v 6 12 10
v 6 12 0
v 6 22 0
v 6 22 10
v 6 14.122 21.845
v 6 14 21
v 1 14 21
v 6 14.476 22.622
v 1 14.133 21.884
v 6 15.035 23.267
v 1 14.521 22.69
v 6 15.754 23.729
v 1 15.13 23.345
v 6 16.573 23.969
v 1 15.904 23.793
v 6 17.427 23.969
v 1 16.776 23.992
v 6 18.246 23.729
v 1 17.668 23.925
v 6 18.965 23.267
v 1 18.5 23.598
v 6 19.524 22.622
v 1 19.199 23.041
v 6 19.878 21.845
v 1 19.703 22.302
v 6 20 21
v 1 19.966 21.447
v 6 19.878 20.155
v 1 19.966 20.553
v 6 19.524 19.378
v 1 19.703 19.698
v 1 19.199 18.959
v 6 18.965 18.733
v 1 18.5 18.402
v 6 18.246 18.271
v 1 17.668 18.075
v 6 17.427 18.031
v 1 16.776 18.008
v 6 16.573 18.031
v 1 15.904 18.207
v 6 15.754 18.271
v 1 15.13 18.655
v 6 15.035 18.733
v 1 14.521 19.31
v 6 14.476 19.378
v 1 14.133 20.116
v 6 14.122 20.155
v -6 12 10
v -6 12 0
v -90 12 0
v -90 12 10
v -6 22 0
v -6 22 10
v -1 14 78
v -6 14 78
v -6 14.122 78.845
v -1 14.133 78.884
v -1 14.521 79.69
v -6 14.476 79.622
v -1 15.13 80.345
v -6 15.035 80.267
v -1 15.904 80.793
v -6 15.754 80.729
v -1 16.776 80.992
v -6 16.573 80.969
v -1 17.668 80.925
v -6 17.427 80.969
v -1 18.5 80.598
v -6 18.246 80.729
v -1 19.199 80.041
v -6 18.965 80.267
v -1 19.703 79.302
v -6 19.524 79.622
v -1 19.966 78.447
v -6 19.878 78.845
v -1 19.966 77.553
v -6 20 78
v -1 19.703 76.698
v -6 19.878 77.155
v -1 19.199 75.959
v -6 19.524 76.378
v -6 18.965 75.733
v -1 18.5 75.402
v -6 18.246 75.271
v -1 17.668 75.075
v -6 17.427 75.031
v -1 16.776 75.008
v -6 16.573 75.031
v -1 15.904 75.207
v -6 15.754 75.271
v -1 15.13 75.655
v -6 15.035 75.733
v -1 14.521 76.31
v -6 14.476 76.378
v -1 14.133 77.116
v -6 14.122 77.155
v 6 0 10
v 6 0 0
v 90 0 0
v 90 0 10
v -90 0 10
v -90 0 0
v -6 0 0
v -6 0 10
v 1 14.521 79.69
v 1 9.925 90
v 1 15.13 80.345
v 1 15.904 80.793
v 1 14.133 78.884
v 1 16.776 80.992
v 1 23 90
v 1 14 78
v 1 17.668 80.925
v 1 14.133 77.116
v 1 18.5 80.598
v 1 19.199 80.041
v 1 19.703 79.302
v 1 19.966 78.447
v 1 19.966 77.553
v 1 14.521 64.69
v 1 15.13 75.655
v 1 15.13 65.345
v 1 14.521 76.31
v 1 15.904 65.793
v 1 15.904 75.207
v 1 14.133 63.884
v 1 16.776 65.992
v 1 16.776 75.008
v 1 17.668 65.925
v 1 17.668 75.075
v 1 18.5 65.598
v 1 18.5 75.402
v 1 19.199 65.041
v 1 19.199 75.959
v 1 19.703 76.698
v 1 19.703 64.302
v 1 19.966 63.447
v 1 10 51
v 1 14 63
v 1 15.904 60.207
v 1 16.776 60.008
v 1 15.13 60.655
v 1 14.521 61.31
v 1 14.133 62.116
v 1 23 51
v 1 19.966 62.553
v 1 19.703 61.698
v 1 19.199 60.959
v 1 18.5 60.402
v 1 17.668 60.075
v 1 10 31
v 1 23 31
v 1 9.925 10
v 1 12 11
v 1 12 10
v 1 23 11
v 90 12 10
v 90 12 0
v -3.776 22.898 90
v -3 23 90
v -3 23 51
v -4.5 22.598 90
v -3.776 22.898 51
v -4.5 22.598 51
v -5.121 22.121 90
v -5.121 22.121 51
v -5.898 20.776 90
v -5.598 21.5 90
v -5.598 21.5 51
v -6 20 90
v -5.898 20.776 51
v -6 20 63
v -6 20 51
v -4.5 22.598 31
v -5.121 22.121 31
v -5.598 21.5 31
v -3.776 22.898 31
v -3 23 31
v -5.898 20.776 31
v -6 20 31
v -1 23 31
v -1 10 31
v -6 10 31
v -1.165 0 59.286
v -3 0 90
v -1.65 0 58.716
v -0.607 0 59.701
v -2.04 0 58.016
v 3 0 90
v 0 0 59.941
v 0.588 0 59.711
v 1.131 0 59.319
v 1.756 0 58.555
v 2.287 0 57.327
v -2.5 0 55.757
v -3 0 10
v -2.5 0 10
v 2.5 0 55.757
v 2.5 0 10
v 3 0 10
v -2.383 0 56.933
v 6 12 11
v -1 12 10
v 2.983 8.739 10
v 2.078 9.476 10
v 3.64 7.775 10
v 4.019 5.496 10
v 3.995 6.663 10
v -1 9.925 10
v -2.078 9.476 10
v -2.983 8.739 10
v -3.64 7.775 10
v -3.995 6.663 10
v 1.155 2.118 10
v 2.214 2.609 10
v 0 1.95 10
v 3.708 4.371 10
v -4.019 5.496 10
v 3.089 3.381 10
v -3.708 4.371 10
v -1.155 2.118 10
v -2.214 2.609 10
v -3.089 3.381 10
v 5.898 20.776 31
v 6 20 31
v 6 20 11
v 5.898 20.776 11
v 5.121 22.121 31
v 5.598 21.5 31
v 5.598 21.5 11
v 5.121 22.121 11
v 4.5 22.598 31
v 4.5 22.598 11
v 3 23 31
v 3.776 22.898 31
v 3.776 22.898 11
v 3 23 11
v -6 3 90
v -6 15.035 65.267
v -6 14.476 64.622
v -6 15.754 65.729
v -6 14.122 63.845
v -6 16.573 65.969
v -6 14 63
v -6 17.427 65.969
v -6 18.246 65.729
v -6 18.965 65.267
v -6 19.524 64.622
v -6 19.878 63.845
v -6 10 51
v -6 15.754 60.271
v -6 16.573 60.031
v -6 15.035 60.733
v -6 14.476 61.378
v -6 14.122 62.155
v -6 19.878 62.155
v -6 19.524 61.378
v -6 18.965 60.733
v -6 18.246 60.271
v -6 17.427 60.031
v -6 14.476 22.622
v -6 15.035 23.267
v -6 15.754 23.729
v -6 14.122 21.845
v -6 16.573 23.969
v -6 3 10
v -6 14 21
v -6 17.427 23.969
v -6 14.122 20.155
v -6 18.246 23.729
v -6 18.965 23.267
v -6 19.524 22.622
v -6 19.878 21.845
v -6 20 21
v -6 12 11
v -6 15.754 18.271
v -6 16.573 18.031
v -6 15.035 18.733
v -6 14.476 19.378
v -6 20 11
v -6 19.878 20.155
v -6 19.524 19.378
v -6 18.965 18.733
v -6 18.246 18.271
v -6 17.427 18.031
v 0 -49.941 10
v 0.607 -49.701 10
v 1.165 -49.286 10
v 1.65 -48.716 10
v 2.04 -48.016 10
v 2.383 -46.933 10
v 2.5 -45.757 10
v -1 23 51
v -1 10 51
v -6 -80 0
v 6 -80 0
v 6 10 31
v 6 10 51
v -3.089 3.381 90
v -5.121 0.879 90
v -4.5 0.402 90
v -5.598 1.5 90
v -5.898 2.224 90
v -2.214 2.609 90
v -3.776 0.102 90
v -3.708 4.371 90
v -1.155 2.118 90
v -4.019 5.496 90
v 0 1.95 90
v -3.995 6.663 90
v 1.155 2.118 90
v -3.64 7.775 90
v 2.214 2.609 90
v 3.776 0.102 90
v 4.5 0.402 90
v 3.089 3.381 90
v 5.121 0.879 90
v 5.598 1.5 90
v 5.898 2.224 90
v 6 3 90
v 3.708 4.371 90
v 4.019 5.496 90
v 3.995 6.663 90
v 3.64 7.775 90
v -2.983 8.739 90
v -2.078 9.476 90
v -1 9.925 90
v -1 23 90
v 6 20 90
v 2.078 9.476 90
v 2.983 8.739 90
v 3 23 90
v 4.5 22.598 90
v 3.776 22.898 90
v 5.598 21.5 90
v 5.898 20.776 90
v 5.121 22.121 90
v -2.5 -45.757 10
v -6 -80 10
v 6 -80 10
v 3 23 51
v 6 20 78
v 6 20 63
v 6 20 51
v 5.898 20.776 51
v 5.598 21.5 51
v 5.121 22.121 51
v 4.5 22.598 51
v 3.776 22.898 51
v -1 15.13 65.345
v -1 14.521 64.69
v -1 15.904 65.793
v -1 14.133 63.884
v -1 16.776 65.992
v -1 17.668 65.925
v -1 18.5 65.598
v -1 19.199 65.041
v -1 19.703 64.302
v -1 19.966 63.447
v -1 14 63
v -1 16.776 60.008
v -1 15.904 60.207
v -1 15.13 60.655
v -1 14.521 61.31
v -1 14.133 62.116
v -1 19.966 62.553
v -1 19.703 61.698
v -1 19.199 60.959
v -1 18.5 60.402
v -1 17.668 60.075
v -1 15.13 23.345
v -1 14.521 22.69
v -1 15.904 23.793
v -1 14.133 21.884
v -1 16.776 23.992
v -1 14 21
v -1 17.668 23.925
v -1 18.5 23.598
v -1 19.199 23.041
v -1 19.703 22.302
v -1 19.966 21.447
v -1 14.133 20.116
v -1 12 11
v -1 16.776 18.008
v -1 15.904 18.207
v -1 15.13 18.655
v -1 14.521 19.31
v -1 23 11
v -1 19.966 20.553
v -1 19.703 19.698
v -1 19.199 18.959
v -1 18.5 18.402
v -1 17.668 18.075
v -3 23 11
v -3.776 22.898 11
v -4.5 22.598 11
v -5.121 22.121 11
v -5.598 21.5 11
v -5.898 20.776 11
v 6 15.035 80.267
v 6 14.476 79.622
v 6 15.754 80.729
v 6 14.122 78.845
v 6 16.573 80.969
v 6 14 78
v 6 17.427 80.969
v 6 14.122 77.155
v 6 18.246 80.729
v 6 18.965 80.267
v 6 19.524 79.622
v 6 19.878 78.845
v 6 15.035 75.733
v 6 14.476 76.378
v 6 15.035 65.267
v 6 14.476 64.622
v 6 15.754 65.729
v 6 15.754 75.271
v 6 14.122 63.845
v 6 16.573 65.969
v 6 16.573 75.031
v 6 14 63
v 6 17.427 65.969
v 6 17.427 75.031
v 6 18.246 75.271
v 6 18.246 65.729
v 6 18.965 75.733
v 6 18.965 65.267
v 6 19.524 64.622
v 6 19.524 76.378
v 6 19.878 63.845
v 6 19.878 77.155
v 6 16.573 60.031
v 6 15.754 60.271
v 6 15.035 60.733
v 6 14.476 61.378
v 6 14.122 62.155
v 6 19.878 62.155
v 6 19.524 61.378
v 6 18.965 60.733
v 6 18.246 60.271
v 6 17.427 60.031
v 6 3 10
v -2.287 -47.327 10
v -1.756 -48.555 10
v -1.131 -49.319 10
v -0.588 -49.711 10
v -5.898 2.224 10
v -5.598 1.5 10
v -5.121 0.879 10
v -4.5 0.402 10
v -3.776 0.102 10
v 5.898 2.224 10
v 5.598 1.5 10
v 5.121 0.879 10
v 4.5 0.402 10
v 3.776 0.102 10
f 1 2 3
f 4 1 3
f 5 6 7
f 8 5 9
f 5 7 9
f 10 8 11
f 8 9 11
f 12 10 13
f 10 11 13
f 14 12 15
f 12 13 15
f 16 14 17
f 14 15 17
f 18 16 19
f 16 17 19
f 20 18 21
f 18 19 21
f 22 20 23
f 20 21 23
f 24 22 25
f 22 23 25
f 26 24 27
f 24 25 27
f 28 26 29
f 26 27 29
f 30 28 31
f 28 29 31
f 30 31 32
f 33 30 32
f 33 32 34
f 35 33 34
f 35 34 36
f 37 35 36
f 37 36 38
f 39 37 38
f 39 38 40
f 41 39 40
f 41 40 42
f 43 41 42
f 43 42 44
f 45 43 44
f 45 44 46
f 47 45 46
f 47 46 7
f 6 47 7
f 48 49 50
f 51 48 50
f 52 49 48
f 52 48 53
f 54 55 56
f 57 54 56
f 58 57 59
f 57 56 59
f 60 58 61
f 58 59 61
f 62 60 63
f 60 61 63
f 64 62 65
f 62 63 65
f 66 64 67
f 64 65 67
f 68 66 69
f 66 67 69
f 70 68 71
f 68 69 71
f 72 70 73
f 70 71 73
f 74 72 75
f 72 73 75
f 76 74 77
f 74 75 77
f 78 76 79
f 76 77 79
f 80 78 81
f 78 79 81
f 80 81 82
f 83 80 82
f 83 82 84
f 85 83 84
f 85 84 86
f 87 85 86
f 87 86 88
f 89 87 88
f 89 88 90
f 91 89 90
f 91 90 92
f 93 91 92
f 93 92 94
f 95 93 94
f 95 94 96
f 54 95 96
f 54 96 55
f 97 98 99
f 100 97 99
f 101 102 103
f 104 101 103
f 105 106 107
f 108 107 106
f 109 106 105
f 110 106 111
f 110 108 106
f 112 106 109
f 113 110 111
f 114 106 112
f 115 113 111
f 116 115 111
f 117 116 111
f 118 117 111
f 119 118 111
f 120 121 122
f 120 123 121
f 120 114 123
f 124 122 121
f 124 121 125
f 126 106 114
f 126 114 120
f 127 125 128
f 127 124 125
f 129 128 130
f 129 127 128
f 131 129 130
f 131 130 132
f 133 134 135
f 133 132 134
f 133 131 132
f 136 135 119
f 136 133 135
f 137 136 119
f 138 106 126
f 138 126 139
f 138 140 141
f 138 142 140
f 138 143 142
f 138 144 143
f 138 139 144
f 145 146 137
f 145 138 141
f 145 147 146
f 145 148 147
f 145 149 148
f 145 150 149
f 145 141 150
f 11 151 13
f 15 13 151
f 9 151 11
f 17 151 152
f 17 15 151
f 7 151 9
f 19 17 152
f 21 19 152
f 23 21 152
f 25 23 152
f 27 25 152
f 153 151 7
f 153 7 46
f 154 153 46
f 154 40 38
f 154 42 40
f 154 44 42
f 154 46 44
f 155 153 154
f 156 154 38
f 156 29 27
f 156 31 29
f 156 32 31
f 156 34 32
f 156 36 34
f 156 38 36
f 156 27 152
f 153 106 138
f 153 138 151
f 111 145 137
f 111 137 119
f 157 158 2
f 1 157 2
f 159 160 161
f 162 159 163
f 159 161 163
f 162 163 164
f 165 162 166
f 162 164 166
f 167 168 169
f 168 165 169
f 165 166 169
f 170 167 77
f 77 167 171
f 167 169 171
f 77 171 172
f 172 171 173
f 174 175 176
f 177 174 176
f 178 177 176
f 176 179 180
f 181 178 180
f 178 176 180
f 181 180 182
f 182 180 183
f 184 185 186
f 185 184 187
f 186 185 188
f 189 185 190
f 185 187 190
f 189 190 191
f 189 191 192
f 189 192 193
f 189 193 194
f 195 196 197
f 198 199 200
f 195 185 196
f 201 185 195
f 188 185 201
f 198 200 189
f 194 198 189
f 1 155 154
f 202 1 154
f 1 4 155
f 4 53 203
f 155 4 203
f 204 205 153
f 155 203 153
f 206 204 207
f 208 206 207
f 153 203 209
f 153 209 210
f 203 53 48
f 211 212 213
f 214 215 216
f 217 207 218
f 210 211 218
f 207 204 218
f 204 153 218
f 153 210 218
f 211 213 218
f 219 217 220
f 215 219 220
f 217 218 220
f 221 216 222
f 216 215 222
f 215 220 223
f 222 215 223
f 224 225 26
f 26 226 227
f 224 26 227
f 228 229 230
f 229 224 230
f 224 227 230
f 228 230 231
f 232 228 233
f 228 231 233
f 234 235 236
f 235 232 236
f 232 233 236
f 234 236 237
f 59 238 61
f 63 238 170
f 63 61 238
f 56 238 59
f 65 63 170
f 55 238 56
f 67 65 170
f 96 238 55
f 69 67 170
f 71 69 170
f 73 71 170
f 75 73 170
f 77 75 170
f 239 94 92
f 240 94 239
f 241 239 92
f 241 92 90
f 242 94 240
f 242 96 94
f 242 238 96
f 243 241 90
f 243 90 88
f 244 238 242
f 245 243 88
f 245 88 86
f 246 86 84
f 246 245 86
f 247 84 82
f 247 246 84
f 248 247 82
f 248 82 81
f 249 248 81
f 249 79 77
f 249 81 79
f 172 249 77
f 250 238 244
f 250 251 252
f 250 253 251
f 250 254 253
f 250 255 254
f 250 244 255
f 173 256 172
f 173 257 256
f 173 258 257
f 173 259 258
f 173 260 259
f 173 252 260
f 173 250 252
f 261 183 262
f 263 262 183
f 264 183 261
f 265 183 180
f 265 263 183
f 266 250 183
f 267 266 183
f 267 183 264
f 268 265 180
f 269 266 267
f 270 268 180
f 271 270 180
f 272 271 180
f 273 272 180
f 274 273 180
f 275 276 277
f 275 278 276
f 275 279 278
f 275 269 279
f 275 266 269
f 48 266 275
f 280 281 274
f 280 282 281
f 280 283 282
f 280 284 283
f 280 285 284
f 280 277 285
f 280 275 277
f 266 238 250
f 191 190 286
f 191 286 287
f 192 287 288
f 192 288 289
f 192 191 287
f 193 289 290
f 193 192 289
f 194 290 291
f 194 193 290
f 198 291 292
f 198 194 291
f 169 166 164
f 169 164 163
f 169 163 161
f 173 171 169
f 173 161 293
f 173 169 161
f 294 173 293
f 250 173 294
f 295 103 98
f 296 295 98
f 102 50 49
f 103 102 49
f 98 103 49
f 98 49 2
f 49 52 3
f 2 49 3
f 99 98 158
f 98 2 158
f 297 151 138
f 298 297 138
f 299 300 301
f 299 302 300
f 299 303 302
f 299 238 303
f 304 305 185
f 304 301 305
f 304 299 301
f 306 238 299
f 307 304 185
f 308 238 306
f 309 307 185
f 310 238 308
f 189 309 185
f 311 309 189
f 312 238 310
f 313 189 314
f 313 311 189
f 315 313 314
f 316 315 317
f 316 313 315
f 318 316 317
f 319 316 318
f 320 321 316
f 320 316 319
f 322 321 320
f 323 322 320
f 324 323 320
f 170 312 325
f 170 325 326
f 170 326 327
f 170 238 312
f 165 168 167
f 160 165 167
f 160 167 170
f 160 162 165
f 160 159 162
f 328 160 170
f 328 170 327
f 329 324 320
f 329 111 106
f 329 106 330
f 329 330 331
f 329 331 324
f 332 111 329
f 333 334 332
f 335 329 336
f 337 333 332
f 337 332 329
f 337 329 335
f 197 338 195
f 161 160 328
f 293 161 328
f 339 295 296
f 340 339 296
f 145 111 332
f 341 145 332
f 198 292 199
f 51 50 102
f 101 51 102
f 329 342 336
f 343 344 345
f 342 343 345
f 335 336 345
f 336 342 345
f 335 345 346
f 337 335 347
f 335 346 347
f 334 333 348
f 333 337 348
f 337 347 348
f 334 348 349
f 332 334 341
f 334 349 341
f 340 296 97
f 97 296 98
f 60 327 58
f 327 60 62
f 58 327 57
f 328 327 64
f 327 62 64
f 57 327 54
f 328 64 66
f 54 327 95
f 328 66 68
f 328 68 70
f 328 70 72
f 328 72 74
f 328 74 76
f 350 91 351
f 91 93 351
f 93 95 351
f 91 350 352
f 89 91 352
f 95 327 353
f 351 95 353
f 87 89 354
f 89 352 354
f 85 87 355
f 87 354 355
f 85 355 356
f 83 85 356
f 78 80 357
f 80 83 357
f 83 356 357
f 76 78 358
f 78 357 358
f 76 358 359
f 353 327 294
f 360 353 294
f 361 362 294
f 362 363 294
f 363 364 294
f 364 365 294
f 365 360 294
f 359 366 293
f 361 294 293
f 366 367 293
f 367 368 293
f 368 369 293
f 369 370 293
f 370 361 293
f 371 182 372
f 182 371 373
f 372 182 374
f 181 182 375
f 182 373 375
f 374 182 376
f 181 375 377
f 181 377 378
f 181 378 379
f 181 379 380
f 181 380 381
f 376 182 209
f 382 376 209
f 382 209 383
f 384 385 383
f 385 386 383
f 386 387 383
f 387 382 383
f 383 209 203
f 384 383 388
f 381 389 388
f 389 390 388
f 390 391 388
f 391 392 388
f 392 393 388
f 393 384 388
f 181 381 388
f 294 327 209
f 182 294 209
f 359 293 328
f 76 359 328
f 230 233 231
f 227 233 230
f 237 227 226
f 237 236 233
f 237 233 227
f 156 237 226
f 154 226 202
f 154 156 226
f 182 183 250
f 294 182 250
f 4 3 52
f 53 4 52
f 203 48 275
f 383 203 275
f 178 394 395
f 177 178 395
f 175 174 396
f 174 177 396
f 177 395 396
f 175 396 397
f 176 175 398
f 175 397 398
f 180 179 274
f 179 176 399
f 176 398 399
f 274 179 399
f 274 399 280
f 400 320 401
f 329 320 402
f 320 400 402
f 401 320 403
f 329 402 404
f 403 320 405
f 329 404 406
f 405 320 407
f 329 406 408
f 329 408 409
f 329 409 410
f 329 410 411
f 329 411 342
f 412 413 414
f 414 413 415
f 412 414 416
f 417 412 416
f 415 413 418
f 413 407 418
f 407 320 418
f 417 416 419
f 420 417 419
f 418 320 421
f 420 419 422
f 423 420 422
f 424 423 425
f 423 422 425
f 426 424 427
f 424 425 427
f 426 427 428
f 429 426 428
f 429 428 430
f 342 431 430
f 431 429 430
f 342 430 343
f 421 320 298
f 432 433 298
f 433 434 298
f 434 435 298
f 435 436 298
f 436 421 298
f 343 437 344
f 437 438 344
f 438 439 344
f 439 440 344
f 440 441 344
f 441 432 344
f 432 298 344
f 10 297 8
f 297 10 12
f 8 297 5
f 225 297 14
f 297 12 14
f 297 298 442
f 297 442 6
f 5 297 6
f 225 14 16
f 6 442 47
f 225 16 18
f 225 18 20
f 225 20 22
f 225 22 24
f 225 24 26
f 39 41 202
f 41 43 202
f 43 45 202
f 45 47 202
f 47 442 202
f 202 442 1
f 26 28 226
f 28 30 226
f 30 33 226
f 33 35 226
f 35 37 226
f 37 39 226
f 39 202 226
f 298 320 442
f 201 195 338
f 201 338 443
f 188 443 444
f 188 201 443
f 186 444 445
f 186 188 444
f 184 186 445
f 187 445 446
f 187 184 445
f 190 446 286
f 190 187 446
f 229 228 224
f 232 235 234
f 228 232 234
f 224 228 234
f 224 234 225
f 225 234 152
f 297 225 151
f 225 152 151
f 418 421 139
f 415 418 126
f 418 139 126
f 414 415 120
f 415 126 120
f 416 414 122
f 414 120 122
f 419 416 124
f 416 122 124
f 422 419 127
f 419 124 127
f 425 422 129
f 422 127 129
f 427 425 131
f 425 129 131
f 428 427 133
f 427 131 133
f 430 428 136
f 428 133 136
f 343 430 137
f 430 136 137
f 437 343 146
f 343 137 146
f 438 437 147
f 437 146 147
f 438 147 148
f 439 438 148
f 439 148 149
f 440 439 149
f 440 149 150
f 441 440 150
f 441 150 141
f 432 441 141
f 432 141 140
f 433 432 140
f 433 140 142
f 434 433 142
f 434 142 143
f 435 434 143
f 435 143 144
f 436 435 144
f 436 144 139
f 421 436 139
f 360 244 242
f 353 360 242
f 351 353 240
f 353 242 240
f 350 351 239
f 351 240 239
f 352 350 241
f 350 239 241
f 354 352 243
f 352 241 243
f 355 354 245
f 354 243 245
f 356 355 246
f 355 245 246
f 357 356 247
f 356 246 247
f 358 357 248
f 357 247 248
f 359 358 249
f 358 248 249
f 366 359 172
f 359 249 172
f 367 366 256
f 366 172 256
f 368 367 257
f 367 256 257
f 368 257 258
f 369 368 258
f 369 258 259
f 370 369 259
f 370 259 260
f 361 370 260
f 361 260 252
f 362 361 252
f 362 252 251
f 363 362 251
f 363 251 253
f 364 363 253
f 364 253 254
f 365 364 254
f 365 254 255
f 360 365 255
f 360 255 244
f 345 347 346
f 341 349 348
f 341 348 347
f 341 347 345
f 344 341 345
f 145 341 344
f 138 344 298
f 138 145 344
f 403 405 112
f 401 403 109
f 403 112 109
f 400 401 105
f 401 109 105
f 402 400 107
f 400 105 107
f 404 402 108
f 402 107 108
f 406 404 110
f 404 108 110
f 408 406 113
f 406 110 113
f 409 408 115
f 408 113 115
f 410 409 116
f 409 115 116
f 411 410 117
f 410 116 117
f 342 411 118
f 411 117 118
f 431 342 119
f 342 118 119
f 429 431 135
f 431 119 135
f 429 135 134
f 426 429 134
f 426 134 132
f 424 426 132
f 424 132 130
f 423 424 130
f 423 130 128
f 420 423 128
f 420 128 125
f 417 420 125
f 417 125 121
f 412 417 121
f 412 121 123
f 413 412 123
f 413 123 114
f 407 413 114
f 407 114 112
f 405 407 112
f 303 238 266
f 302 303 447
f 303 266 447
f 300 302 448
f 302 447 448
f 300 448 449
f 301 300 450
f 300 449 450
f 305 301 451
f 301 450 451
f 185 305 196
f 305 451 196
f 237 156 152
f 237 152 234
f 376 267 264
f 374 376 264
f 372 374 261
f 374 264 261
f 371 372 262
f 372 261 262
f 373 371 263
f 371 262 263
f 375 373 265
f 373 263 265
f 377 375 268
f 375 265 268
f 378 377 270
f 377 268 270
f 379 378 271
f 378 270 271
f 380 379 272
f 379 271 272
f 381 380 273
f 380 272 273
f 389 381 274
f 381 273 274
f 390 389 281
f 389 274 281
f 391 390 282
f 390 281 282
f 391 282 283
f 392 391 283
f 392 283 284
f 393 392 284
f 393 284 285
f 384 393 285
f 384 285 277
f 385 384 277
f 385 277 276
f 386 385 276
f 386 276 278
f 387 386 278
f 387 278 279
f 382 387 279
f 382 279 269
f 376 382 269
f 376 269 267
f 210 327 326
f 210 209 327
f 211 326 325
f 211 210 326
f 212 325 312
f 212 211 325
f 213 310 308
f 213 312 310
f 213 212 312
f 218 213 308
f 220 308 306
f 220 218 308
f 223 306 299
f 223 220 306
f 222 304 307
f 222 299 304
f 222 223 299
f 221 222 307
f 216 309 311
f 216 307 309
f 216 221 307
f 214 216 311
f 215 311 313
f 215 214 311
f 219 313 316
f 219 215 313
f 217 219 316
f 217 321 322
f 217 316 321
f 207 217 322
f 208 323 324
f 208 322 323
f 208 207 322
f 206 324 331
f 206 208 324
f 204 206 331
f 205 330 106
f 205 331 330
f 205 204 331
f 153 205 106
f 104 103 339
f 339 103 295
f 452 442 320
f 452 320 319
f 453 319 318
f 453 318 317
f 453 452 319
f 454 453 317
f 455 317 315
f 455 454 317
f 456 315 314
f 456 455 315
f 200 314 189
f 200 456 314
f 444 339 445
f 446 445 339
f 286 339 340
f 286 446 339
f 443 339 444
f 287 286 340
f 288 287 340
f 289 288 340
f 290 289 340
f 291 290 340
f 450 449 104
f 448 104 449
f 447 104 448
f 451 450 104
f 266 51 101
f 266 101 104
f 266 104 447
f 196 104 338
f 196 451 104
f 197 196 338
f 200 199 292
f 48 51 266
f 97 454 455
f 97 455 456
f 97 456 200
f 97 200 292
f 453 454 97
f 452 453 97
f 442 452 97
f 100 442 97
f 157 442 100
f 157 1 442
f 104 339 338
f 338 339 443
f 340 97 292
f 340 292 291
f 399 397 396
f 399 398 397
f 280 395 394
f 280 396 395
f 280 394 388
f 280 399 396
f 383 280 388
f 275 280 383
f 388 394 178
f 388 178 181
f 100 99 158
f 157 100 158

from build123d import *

# Parameters (mm, degrees)
F1_DEPTH      = 10
F3_W          = 12
F3_H          = 23
F3_R          = 4.05
F4_DEPTH      = 80
F5_W          = 2
F5_H          = 39.0547718853
F6_DEPTH      = 80
F7_W          = 11
F7_H          = 1
F7_W_2        = 13
F7_H_2        = 20
F7_R          = 3
F8_DEPTH      = 25
F10_DEPTH     = 2.5
F11_T1_DEPTH  = 87.5
F11_T3_DEPTH  = 54
F11_T5_DEPTH  = 27.5
F11_T10_DEPTH = 85.7106781187
F11_T16_DEPTH = 85.7106781187


# Not quite as in the source:
# - a fillet or chamfer that OpenCascade refuses, or shapes differently, is made with other operations: its cross-section is extruded or revolved along the edge and cut away or added


with BuildPart() as f1:
    # F0 (on Top) → F1 (new body)
    with BuildSketch(Plane.XY):
        Polygon((6, 22), (0, 22), (-6, 22), (-6, 12), (-90, 12), (-90, 0), (-6, 0), (-6, -80), (6, -80), (6, 0), (90, 0), (90, 12), (6, 12), align=None)
    extrude(amount=F1_DEPTH)

    # F3 (on face) → F4 (join)
    with BuildSketch(Plane.XY.offset(10)):
        with Locations((0, 11.5)):
            Rectangle(F3_W, F3_H)
        with Locations((0, 6)):
            Circle(F3_R, mode=Mode.SUBTRACT)
    extrude(amount=F4_DEPTH)

    # F5 (on face) → F6 (cut, through all)
    with BuildSketch(Plane.XY.offset(10)):
        with Locations((0, 25.7887821645)):
            Rectangle(F5_W, F5_H)
    extrude(amount=F6_DEPTH, mode=Mode.SUBTRACT)

    # F7 (on face) → F8 (cut)
    with BuildSketch(Plane(origin=(-6, 0, 0), x_dir=(0, -1, 0), z_dir=(-1, 0, 0))):
        with Locations((-17.5, 10.5)):
            Rectangle(F7_W, F7_H)
        with Locations((-16.5, 41)):
            Rectangle(F7_W_2, F7_H_2)
        with Locations((-17, 21)):
            Circle(F7_R)
        with Locations((-17, 78)):
            Circle(F7_R)
        with Locations((-17, 63)):
            Circle(F7_R)
    extrude(amount=-F8_DEPTH, mode=Mode.SUBTRACT)

    # F9 (on Right) → F10 (join, symmetric)
    with BuildSketch(Plane.YZ):
        Polygon((0, 10), (0, 60), (-50, 10), align=None)
    extrude(amount=F10_DEPTH, both=True)

    # F11: fillet of radius 3 on 8 edges, made by hand

    # F11_s2 → F11_t1 (cut)
    with BuildSketch(Plane.XY.offset(10)):
        with BuildLine():
            ThreePointArc((-6, 3), (-5.1213203436, 0.8786796564), (-3, 0))
            Line((-3, 0), (-6, 0))
            Line((-6, 0), (-6, 3))
        make_face()
        with BuildLine():
            ThreePointArc((6, 3), (5.1213203436, 0.8786796564), (3, 0))
            Line((3, 0), (6, 0))
            Line((6, 0), (6, 3))
        make_face()
    extrude(amount=F11_T1_DEPTH, mode=Mode.SUBTRACT)

    # F11_s4 → F11_t3 (cut)
    with BuildSketch(Plane.XY.offset(43.5)):
        with BuildLine():
            ThreePointArc((-3, 23), (-5.1213203436, 22.1213203436), (-6, 20))
            Line((-6, 20), (-6, 23))
            Line((-6, 23), (-3, 23))
        make_face()
        with BuildLine():
            ThreePointArc((6, 20), (5.1213203436, 22.1213203436), (3, 23))
            Line((3, 23), (6, 23))
            Line((6, 23), (6, 20))
        make_face()
    extrude(amount=F11_T3_DEPTH, mode=Mode.SUBTRACT)

    # F11_s6 → F11_t5 (cut)
    with BuildSketch(Plane.XY.offset(11)):
        with BuildLine():
            ThreePointArc((6, 20), (5.1213203436, 22.1213203436), (3, 23))
            Line((3, 23), (6, 23))
            Line((6, 23), (6, 20))
        make_face()
        with BuildLine():
            ThreePointArc((-3, 23), (-5.1213203436, 22.1213203436), (-6, 20))
            Line((-6, 20), (-6, 23))
            Line((-6, 23), (-3, 23))
        make_face()
    extrude(amount=F11_T5_DEPTH, mode=Mode.SUBTRACT)


with BuildPart() as f11_tool8:
    # F11_s9 → F11_t10 (new body)
    with BuildSketch(Plane(origin=(0, 35.3033008589, 35.3033008589), x_dir=(1, 0, 0), z_dir=(0, -0.7071067812, -0.7071067812))):
        with BuildLine():
            ThreePointArc((-2.5, 39.4264068712), (-1.6213203436, 41.5477272148), (0.5, 42.4264068712))
            Line((0.5, 42.4264068712), (-2.5, 42.4264068712))
            Line((-2.5, 42.4264068712), (-2.5, 39.4264068712))
        make_face()
    extrude(amount=F11_T10_DEPTH)

    split(bisect_by=Plane.XY.offset(10), keep=Keep.TOP)

    split(bisect_by=Plane.XZ, keep=Keep.TOP)


with BuildPart() as f1_1:
    add(f1.part)

    # F11_t7: cut F11_tool8
    add(f11_tool8.part, mode=Mode.SUBTRACT)


with BuildPart() as f11_tool14:
    # F11_s15 → F11_t16 (new body)
    with BuildSketch(Plane(origin=(0, 35.3033008589, 35.3033008589), x_dir=(1, 0, 0), z_dir=(0, -0.7071067812, -0.7071067812))):
        with BuildLine():
            ThreePointArc((-0.5, 42.4264068712), (1.6213203436, 41.5477272148), (2.5, 39.4264068712))
            Line((2.5, 39.4264068712), (2.5, 42.4264068712))
            Line((2.5, 42.4264068712), (-0.5, 42.4264068712))
        make_face()
    extrude(amount=F11_T16_DEPTH)

    split(bisect_by=Plane.XY.offset(10), keep=Keep.TOP)

    split(bisect_by=Plane.XZ, keep=Keep.TOP)


with BuildPart() as f1_2:
    add(f1_1.part)

    # F11_t13: cut F11_tool14
    add(f11_tool14.part, mode=Mode.SUBTRACT)


solid = f1_2.part
